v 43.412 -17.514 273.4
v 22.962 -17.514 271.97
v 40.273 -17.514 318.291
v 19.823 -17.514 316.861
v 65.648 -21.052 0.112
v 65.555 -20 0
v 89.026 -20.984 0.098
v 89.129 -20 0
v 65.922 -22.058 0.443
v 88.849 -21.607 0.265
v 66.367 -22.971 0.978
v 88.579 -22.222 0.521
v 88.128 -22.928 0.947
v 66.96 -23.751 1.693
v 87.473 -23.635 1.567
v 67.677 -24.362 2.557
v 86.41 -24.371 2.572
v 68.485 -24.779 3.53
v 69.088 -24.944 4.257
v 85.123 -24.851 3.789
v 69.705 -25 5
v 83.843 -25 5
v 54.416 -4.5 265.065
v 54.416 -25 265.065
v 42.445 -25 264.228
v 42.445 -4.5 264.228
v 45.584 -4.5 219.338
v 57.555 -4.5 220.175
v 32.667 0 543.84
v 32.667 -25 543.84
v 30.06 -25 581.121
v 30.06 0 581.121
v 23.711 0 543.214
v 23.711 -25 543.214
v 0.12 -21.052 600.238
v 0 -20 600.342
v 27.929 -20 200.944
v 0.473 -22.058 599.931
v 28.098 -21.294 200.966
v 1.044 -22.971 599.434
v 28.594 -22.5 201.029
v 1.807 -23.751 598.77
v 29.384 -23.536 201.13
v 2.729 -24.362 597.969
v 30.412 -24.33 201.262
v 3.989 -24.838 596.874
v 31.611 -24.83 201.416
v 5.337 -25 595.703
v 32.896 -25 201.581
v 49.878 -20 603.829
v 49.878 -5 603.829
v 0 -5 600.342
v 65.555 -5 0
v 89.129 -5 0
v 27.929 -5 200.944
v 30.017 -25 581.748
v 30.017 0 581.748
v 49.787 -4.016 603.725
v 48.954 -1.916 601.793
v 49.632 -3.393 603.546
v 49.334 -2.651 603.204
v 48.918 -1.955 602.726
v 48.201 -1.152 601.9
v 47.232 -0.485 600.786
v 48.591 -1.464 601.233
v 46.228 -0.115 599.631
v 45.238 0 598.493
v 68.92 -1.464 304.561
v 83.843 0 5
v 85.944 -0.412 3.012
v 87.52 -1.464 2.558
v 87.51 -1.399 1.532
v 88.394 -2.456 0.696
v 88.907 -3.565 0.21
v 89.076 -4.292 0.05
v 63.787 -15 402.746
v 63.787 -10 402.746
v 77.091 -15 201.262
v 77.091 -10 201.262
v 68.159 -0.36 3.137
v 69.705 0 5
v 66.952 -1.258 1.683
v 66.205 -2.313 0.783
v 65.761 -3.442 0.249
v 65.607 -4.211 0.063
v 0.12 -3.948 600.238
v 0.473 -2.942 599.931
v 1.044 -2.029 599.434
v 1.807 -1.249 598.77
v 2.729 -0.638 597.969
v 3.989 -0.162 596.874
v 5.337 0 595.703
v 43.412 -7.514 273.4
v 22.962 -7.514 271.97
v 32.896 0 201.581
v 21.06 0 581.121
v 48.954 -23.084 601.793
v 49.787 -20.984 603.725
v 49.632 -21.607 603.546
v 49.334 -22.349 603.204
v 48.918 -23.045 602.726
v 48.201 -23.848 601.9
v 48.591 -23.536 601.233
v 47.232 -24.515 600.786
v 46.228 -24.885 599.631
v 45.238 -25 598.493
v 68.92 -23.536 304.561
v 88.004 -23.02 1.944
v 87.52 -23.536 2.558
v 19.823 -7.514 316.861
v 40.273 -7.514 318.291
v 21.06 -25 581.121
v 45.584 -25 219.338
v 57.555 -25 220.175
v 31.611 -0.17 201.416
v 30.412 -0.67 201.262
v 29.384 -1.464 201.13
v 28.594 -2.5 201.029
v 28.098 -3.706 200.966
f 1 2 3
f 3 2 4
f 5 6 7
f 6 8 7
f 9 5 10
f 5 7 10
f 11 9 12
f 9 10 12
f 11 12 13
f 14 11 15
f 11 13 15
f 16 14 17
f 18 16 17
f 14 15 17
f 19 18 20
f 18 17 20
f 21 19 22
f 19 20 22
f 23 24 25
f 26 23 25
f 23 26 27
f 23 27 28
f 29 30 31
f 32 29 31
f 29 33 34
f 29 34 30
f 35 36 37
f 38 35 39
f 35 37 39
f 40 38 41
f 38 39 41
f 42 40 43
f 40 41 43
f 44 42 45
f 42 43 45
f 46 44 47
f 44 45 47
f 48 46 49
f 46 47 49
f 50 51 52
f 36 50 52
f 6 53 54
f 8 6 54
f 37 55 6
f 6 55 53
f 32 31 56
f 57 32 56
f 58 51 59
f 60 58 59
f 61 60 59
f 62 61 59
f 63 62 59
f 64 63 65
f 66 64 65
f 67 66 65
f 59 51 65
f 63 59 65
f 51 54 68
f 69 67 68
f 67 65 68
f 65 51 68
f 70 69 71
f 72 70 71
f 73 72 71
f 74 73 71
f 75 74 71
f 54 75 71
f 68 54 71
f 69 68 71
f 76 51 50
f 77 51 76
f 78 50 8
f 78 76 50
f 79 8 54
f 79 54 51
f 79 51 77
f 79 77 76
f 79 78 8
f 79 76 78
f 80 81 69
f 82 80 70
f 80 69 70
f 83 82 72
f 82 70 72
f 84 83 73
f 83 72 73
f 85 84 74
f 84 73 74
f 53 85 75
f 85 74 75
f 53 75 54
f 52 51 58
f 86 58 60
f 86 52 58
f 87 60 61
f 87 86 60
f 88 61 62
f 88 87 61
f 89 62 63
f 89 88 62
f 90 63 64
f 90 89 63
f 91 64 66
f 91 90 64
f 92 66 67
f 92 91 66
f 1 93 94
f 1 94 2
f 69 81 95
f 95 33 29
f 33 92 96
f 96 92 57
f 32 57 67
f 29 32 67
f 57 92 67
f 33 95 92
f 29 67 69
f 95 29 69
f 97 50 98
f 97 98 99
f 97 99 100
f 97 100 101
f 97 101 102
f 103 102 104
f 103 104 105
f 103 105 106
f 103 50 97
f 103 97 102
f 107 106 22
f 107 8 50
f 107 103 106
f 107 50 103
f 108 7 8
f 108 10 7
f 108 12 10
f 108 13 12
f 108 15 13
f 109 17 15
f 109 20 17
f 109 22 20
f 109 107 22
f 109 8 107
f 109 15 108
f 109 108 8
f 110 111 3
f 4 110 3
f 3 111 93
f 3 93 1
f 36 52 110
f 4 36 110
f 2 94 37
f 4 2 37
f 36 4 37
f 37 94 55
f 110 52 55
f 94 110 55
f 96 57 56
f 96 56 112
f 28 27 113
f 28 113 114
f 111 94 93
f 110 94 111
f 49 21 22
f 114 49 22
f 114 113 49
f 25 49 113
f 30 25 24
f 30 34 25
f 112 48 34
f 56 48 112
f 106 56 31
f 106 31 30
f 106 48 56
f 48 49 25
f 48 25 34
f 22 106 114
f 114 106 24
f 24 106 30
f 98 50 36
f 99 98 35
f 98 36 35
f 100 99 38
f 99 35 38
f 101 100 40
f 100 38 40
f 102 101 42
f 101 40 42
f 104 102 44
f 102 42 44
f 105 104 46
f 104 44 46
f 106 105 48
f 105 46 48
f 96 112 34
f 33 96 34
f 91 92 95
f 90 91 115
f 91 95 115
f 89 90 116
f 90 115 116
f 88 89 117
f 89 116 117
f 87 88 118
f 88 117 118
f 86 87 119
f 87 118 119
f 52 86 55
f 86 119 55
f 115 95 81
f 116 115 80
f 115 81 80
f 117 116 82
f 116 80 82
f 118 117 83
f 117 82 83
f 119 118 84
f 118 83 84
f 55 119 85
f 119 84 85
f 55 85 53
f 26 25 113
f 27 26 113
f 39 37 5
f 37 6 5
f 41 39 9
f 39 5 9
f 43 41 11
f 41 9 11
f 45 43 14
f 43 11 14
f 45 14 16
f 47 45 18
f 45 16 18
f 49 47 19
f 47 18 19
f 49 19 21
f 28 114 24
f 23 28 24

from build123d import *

# Parameters (mm, degrees)
F1_DEPTH  = 25
F2_R      = 5
F3_R      = 5
F4_W      = 10
F4_H      = 45
F5_DEPTH  = 20.5
F7_DEPTH  = 20.5
F9_DEPTH  = 25.5
F10_DEPTH = 25
F11_DEPTH = 25.5


with BuildPart() as f1:
    # F0 (on Front) → F1 (new body)
    with BuildSketch(Plane.XZ):
        with BuildLine():
            Line((49.878202513, 603.8294608564), (0, 600.3416371692))
            Line((0, 600.3416371692), (27.9286118029, 200.9438807629))
            Line((27.9286118029, 200.9438807629), (65.5547118832, 0))
            Line((65.5547118832, 0), (89.1294470023, 0))
            add(Edge.make_bspline(
                [(49.878202513, 603.8294608564), (63.8700964242, 403.1540429087), (77.9425227125, 200.9438807629), (89.1294470023, 0)],
                knots=[0, 0, 0, 0, 605.1038571949, 605.1038571949, 605.1038571949, 605.1038571949], degree=3))
        make_face()
    extrude(amount=F1_DEPTH)

    # F2
    f2_edges = [f1.edges().sort_by_distance(p)[0] for p in [
        (24.939101, -25, 602.085549),
        (13.964306, -25, 400.642759),
        (46.741662, -25, 100.47194),
        (77.342079, -25, 0),
        (70.557856, -25, 301.982638),
    ]]
    fillet(f2_edges, radius=F2_R)

    # F3
    f3_edges = [f1.edges().sort_by_distance(p)[0] for p in [
        (24.939101, 0, 602.085549),
        (13.964306, 0, 400.642759),
        (46.741662, 0, 100.47194),
        (77.342079, 0, 0),
        (70.557856, 0, 301.982638),
    ]]
    fillet(f3_edges, radius=F3_R)

    # F4 (on face) → F5 (cut)
    with BuildSketch(Plane(origin=(41.7757036401, 0, 2.9212417723), x_dir=(0, -1, 0), z_dir=(-0.9975640503, 0, -0.0697564737))):
        with Locations((12.5142587349, 292.2062065856)):
            Rectangle(F4_W, F4_H)
    extrude(amount=-F5_DEPTH, mode=Mode.SUBTRACT)

    # F6 (on face) → F7 (cut)
    with BuildSketch(Plane.XZ.offset(25)):
        Polygon((54.4157008116, 265.0651142862), (42.4449322085, 264.2280366013), (45.583973527, 219.3376543396), (57.5547421301, 220.1747320245), align=None)
    extrude(amount=-F7_DEPTH, mode=Mode.SUBTRACT)

    # F8 (on face) → F9 (cut)
    with BuildSketch(Plane.XZ.offset(25)):
        Polygon((21.0604546075, 581.1213909322), (23.7112006098, 543.2139570224), (32.6674069191, 543.8402359767), (30.0604546075, 581.1213909322), (30.0166609169, 581.7476698866), align=None)
    extrude(amount=-F9_DEPTH, mode=Mode.SUBTRACT)

    # F8 (on face) → F10 (cut)
    with BuildSketch(Plane.XZ.offset(25)):
        Polygon((21.0604546075, 581.1213909322), (23.7112006098, 543.2139570224), (32.6674069191, 543.8402359767), (30.0604546075, 581.1213909322), (30.0166609169, 581.7476698866), align=None)
    extrude(amount=-F10_DEPTH, mode=Mode.SUBTRACT)

    # F8 (on face) → F11 (cut)
    with BuildSketch(Plane.XZ.offset(25)):
        Polygon((21.0604546075, 581.1213909322), (23.7112006098, 543.2139570224), (32.6674069191, 543.8402359767), (30.0604546075, 581.1213909322), (30.0166609169, 581.7476698866), align=None)
    extrude(amount=-F11_DEPTH, mode=Mode.SUBTRACT)


solid = f1.part
